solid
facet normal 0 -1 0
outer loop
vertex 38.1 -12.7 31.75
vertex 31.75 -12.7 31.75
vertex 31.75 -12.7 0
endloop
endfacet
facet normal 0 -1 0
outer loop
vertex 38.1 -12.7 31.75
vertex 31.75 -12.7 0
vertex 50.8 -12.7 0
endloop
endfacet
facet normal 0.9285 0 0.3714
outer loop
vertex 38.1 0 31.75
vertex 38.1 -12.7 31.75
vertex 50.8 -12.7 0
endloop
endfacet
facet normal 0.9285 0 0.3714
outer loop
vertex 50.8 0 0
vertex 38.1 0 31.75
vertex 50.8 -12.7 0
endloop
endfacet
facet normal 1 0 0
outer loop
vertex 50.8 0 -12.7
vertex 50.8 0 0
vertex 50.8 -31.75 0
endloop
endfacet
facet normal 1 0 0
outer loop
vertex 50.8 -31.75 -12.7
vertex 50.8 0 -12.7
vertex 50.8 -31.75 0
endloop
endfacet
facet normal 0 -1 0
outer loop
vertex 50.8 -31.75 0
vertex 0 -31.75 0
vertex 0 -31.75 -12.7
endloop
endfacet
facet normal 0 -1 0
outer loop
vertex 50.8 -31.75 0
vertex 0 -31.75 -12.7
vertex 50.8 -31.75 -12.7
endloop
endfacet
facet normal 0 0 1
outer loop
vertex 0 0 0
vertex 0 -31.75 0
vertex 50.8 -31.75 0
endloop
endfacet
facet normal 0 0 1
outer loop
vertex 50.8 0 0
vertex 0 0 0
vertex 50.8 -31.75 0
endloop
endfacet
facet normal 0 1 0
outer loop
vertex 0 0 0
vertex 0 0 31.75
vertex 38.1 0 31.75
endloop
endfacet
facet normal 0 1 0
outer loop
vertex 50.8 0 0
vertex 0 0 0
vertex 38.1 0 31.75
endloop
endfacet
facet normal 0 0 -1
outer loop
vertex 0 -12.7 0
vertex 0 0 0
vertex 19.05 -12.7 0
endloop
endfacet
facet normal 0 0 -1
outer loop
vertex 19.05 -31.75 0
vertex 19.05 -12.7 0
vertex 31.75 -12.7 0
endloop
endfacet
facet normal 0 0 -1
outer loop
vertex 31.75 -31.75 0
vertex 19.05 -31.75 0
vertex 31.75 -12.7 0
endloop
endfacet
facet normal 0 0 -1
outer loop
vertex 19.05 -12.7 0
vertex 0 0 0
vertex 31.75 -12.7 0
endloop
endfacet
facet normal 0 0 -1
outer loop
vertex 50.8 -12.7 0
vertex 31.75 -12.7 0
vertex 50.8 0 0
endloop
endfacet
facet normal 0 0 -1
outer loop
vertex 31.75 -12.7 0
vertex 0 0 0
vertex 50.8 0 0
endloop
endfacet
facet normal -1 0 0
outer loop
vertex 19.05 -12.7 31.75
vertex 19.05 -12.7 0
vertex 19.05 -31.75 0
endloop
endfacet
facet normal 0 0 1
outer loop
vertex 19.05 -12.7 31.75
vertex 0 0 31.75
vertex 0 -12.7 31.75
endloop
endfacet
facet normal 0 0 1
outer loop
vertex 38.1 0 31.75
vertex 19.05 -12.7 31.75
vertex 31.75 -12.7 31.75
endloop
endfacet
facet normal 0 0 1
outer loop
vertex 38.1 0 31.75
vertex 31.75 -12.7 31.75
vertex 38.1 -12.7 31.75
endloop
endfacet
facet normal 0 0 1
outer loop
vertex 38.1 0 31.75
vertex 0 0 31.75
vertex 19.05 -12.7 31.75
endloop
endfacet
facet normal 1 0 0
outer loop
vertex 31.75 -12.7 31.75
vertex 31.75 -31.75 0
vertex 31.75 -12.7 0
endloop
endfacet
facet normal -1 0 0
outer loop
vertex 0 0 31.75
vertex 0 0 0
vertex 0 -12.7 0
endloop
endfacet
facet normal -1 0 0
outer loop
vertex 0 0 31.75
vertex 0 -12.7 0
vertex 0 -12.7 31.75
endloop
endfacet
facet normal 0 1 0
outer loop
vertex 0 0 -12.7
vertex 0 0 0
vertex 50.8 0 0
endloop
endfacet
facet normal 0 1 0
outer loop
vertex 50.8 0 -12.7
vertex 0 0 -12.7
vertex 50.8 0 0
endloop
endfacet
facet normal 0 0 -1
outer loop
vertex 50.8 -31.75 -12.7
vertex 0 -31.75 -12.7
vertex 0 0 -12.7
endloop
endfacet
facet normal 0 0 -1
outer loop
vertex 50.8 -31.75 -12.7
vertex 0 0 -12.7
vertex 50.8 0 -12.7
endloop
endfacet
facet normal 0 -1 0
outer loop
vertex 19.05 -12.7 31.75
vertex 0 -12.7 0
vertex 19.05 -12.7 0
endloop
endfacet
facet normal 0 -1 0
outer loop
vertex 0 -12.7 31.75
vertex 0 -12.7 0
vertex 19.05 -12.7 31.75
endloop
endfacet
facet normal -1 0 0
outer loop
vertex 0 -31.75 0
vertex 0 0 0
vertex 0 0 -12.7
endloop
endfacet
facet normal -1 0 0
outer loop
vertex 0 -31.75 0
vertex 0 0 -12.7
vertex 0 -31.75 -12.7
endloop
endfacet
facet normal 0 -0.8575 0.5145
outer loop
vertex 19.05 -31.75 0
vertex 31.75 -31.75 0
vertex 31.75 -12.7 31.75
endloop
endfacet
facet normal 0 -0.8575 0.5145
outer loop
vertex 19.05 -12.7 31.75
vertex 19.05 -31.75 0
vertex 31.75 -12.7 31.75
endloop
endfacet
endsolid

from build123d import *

# Parameters (mm, degrees)
F0_W      = 50.8
F0_H      = 31.75
F1_DEPTH  = 31.75
F2_W      = 19.05
F2_H      = 31.75
F3_DEPTH  = 19.05
F5_DEPTH  = 12.701
F7_DEPTH  = 19.05
F8_W      = 19.05
F8_H      = 31.75
F9_DEPTH  = 19.05
F10_W     = 50.8
F10_H     = 31.75
F11_DEPTH = 12.7


with BuildPart() as f1:
    # F0 (on Front) → F1 (new body)
    with BuildSketch(Plane.XZ):
        with Locations((25.4, 15.875)):
            Rectangle(F0_W, F0_H)
    extrude(amount=F1_DEPTH)

    # F2 (on face) → F3 (cut)
    with BuildSketch(Plane.XZ.offset(31.75)):
        with Locations((41.275, 15.875)):
            Rectangle(F2_W, F2_H)
    extrude(amount=-F3_DEPTH, mode=Mode.SUBTRACT)

    # F4 (on face) → F5 (cut, through all)
    with BuildSketch(Plane.XZ.offset(12.7)):
        Polygon((50.8, 31.75), (38.1, 31.75), (50.8, 0), align=None)
    extrude(amount=-F5_DEPTH, mode=Mode.SUBTRACT)

    # F6 (on face) → F7 (cut)
    with BuildSketch(Plane.YZ.offset(31.75)):
        Polygon((-31.75, 0), (-12.7, 31.75), (-31.75, 31.75), align=None)
    extrude(amount=-F7_DEPTH, mode=Mode.SUBTRACT)

    # F8 (on face) → F9 (cut)
    with BuildSketch(Plane(origin=(0, 0, 0), x_dir=(0, -1, 0), z_dir=(-1, 0, 0))):
        with Locations((22.225, 15.875)):
            Rectangle(F8_W, F8_H)
    extrude(amount=-F9_DEPTH, mode=Mode.SUBTRACT)


with BuildPart() as f11:
    # F10 (on face) → F11 (new body)
    with BuildSketch(Plane(origin=(0, 0, 0), x_dir=(1, 0, 0), z_dir=(0, 0, -1))):
        with Locations((25.4, 15.875)):
            Rectangle(F10_W, F10_H)
    extrude(amount=F11_DEPTH)


solid = Compound([f1.part, f11.part])
